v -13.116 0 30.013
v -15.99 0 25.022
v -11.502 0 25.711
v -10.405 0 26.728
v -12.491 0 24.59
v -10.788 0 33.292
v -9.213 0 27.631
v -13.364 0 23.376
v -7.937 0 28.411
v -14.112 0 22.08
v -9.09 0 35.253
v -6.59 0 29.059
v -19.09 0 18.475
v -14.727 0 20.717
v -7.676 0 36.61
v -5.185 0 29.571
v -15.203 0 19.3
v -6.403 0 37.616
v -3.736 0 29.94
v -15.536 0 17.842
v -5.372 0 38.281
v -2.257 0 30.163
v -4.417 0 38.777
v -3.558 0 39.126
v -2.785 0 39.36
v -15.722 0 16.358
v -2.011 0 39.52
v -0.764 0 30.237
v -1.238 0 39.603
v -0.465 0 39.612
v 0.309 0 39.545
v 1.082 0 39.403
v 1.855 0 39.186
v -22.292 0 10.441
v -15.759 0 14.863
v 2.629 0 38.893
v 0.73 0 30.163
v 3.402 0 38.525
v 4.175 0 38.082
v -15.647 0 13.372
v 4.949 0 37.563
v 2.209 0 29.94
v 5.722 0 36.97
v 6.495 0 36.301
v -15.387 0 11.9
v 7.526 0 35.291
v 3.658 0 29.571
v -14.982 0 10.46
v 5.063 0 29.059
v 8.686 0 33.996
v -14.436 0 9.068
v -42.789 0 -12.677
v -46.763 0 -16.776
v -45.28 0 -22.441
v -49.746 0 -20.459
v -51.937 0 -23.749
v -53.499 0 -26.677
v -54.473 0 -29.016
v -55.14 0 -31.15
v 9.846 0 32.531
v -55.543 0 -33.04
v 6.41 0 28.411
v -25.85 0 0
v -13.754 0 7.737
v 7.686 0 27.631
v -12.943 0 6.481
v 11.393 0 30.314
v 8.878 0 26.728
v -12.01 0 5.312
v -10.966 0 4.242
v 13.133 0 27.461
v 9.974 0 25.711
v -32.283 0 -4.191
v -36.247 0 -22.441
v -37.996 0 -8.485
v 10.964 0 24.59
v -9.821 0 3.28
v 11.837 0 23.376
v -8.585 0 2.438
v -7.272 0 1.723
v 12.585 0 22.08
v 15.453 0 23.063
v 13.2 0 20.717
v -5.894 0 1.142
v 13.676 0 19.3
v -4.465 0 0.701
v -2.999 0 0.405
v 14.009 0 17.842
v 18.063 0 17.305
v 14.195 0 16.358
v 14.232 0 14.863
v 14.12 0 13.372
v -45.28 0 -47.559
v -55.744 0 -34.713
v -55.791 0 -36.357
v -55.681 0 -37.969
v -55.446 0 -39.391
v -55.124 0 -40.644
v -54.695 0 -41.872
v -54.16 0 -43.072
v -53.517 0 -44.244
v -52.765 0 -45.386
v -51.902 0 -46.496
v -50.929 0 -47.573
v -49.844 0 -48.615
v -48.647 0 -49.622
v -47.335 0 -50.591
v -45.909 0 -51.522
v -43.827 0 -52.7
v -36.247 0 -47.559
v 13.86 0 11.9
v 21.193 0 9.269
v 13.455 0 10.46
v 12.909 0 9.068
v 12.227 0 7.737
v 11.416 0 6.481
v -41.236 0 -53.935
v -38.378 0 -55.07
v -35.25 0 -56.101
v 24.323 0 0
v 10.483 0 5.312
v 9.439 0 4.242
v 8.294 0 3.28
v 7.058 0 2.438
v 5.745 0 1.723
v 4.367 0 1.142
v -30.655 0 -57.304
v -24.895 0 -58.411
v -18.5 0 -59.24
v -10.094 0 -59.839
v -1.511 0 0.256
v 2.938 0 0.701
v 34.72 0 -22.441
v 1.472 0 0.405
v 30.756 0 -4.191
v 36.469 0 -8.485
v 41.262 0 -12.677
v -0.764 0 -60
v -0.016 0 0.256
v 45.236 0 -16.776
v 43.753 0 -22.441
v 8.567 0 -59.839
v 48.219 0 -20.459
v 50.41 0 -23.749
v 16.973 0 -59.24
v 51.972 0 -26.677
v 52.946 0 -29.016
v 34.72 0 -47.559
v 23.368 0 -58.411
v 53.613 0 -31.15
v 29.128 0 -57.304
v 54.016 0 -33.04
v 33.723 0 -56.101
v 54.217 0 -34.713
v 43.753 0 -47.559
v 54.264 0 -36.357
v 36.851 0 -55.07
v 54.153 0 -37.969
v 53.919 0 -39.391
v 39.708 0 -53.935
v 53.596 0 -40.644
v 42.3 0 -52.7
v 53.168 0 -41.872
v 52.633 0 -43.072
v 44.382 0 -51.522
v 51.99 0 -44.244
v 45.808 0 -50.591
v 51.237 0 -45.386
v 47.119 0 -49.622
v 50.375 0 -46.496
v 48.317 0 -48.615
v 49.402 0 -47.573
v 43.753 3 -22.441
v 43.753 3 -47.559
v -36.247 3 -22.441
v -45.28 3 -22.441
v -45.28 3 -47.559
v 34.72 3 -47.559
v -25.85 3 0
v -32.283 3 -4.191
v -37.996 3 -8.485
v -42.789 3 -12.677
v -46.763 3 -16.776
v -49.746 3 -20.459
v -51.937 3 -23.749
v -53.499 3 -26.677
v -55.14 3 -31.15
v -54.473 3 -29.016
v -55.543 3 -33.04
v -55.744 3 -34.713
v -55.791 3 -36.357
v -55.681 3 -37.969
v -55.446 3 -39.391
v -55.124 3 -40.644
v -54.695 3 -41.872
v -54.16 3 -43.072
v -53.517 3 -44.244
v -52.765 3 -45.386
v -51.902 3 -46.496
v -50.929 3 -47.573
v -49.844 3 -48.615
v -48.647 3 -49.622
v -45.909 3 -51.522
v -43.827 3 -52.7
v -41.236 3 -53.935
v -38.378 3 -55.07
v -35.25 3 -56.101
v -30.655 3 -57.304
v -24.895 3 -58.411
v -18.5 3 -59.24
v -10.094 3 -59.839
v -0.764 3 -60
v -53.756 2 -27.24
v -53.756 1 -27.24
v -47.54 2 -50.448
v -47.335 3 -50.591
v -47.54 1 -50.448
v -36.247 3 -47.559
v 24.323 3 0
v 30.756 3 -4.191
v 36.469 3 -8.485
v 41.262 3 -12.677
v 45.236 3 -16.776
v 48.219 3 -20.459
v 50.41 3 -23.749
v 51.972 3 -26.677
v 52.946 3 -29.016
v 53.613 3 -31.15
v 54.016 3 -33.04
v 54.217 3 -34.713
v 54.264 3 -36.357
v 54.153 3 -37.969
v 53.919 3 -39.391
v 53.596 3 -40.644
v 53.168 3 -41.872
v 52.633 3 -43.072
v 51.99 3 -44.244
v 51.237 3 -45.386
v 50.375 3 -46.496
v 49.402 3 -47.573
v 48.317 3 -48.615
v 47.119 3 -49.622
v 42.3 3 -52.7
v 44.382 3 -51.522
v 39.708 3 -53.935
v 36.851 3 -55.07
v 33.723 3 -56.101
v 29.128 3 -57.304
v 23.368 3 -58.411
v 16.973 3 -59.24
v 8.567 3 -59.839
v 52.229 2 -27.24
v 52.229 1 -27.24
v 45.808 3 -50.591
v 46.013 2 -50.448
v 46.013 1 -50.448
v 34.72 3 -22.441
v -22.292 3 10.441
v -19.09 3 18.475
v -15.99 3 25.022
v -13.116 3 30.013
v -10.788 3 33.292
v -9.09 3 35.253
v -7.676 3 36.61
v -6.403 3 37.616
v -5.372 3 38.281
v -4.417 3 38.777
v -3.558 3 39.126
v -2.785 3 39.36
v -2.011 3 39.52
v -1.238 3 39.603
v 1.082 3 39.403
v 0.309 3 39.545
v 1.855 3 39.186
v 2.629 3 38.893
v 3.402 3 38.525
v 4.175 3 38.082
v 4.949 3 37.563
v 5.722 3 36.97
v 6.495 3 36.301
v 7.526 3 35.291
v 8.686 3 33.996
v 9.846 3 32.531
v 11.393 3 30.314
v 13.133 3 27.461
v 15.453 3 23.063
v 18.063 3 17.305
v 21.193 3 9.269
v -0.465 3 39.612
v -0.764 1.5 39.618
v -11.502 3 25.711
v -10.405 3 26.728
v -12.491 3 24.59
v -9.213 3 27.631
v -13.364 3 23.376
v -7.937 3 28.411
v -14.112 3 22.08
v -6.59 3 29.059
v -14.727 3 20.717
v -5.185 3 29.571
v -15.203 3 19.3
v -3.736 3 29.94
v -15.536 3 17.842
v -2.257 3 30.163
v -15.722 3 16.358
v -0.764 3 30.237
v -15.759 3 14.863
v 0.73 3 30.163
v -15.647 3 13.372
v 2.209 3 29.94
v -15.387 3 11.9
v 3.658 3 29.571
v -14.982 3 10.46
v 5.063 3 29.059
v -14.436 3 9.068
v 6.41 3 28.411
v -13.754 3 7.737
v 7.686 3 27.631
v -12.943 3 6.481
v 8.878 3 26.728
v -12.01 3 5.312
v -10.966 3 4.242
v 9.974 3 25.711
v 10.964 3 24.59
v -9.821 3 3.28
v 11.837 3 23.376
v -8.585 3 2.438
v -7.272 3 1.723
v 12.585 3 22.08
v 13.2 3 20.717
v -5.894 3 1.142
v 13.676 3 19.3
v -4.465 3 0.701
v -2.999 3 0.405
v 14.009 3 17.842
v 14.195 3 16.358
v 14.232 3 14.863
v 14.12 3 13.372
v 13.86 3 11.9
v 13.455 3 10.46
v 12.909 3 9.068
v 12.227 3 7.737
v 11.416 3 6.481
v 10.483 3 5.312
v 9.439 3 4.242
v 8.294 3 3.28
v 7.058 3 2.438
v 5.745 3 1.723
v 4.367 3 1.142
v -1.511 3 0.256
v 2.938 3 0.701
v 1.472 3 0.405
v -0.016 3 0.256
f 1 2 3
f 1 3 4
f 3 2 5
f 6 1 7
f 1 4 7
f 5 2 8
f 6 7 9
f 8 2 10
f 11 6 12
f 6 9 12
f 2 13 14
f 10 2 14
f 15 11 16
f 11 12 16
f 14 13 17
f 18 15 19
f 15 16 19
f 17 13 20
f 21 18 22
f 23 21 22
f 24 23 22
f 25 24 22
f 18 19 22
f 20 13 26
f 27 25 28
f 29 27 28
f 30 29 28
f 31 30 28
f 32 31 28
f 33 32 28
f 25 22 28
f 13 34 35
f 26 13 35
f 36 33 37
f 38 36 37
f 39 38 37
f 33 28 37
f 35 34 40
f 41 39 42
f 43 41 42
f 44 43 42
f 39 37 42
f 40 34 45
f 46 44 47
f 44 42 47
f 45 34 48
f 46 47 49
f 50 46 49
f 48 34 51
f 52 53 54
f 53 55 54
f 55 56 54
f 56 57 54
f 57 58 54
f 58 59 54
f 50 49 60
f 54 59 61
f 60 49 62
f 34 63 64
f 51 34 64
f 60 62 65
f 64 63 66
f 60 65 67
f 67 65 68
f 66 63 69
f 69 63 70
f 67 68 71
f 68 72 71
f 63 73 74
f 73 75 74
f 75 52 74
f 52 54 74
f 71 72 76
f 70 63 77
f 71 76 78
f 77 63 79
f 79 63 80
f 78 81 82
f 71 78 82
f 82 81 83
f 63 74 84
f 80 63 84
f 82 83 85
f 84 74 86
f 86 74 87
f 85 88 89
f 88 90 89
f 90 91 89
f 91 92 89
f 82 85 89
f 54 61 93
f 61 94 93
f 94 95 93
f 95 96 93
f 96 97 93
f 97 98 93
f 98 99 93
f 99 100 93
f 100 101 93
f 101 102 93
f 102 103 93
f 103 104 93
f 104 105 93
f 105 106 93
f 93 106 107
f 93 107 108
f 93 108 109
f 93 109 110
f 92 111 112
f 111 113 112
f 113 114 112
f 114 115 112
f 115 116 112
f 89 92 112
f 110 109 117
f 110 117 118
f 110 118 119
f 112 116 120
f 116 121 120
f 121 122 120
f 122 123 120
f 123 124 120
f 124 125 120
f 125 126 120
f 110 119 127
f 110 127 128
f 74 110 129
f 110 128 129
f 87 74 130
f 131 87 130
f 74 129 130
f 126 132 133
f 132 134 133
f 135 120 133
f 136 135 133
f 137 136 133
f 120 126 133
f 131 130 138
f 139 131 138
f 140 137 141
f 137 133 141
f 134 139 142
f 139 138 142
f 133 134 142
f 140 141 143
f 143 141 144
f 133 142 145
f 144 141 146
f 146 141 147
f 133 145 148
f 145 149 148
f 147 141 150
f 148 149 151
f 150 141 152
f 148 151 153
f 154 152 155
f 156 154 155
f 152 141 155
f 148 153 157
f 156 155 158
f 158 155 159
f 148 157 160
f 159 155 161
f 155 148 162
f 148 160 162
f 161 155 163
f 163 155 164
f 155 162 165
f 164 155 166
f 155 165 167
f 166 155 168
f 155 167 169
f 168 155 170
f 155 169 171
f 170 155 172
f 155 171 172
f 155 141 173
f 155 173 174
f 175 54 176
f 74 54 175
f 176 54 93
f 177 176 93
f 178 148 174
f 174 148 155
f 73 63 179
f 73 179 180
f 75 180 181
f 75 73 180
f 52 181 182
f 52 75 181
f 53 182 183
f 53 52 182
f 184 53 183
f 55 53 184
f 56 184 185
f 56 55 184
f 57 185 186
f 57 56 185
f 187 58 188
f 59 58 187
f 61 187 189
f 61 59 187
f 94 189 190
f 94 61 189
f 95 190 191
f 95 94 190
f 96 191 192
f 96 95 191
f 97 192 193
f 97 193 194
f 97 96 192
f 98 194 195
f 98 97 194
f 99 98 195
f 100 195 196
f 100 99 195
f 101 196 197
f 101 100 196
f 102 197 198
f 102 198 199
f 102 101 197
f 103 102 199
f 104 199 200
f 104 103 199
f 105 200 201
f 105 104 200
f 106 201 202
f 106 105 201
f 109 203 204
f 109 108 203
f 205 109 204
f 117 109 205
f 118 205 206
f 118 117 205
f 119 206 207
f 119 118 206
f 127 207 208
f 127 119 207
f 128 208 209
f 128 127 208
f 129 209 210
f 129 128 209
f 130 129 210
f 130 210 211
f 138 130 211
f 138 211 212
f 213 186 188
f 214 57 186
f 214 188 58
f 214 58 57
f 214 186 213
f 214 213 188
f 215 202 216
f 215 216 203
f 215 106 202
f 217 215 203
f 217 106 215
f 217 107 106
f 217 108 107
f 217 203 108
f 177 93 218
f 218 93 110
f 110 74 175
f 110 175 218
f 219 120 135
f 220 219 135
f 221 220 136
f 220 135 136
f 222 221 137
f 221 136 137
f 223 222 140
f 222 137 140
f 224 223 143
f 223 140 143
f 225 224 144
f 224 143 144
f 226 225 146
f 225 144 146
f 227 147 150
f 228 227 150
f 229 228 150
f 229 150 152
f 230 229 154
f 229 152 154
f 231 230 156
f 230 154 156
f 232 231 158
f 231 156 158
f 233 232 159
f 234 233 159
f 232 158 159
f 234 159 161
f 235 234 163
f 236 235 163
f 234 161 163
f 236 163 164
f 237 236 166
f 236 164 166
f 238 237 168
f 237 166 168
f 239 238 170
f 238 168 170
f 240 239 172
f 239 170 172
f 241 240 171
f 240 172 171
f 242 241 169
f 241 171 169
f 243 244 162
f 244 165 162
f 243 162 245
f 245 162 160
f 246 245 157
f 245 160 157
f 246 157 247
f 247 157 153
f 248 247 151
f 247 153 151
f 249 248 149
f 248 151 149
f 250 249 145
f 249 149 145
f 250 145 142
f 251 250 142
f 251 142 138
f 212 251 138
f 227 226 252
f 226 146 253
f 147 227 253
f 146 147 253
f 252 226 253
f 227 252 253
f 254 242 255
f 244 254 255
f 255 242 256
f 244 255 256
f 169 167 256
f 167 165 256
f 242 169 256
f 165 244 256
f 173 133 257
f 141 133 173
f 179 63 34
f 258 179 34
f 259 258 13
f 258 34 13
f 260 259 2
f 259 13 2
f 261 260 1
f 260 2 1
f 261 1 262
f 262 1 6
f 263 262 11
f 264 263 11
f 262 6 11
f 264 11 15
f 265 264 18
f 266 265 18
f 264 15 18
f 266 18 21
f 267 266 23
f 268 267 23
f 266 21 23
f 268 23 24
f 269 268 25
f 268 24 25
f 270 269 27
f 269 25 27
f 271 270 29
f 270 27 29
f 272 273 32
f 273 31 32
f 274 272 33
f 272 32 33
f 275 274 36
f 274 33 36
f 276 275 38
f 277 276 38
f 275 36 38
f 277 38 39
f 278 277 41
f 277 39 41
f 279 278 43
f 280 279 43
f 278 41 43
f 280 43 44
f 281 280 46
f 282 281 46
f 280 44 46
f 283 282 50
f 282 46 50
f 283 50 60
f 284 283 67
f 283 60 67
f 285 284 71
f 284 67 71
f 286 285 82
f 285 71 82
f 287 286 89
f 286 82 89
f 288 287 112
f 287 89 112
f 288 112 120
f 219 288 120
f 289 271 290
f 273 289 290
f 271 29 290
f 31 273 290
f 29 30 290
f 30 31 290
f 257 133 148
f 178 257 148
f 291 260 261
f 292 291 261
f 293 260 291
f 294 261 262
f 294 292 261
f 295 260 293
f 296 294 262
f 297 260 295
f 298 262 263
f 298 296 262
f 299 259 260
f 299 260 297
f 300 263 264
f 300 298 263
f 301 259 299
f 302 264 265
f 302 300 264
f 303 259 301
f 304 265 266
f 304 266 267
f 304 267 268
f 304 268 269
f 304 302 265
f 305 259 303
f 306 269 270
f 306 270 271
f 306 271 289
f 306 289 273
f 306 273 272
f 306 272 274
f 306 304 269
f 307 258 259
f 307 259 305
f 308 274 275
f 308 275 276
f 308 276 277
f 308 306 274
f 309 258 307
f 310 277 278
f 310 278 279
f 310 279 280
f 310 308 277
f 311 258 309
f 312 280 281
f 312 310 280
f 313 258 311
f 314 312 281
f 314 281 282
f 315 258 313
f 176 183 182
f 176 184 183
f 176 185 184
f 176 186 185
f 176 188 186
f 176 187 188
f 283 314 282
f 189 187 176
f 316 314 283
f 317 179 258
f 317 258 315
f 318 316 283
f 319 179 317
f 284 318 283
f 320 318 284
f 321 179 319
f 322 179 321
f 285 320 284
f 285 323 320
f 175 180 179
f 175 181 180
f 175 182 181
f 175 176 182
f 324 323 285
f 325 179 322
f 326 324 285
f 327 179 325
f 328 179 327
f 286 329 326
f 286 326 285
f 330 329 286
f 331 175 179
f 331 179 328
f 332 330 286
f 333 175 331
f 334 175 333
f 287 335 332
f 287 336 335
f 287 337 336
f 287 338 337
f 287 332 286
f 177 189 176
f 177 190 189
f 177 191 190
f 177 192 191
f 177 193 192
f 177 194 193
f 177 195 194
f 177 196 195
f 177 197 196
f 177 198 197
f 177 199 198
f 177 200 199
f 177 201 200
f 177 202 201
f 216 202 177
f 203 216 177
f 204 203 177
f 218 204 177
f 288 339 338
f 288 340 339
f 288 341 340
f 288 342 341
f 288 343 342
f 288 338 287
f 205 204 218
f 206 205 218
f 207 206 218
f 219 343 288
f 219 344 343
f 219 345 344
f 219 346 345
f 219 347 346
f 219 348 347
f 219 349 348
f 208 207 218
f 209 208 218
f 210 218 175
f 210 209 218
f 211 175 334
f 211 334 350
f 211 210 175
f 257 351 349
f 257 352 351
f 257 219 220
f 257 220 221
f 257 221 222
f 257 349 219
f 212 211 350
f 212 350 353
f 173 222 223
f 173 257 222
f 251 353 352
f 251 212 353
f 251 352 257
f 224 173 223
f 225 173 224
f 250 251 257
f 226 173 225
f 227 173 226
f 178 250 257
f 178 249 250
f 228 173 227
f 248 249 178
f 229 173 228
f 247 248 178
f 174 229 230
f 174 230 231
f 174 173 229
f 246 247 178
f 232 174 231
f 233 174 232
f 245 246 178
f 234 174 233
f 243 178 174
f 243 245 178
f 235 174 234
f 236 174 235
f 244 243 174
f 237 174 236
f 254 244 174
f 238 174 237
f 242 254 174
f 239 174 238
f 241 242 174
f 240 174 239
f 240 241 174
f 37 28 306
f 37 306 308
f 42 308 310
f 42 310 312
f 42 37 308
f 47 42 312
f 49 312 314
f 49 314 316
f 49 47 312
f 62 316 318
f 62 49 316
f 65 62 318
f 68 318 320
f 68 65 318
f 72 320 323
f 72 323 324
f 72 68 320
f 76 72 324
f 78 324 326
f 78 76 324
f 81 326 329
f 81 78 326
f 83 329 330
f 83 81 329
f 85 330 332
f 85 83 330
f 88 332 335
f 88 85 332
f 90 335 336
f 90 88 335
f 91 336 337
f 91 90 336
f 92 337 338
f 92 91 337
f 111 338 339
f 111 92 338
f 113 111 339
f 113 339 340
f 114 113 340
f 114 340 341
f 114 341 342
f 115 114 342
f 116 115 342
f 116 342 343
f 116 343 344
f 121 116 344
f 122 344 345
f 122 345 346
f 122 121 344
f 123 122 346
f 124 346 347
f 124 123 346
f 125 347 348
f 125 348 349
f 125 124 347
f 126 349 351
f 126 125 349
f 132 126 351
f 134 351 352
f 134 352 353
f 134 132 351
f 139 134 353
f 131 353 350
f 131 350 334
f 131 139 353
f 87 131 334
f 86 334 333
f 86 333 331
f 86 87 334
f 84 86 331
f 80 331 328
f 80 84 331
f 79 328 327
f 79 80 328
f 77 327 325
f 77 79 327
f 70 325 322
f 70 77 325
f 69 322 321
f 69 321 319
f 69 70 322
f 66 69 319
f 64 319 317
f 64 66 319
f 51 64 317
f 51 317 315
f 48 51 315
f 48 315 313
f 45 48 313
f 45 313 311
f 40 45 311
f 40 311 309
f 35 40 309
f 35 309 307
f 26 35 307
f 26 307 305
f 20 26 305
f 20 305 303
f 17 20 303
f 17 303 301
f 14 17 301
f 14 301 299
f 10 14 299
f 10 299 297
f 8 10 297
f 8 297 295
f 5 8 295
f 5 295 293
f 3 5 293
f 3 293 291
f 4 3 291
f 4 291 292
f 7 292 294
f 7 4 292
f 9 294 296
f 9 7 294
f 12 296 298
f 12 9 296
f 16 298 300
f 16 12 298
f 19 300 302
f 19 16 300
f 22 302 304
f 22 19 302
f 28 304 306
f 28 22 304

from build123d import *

# Parameters (mm, degrees)
SKETCH1_R           = 15
SKETCH1_W           = 9.033789511
SKETCH1_H           = 25.11797261
BOSS_EXTRUDE1_DEPTH = 3


with BuildPart() as part:
    # Sketch1 → Boss-Extrude1 (new body)
    with BuildSketch(Plane(origin=(0, 0, 0), x_dir=(1, 0, 0), z_dir=(0, 1, 0))):
        with BuildLine():
            add(Edge.make_bspline(
                [(-25.850267552, 0), (-0.763553632, -79.235152429), (24.323160288, 0)],
                knots=[0, 0, 0, 1, 1, 1], degree=2))
            add(Edge.make_bspline(
                [(24.323160288, 0), (67.143381198, 26.049823561), (68.440320284, 60.482028786), (-0.763553632, 60)],
                knots=[0, 0, 0, 0, 1, 1, 1, 1], degree=3))
            add(Edge.make_bspline(
                [(-25.850267552, 0), (-68.670488462, 26.049823561), (-69.967427548, 60.482028786), (-0.763553632, 60)],
                knots=[0, 0, 0, 0, 1, 1, 1, 1], degree=3))
        make_face()
        with Locations(Location((-0.763553632, -15.237324398, 0), (0, 0, 270))):
            Circle(SKETCH1_R, mode=Mode.SUBTRACT)
        with Locations((39.236446368, 35)):
            Rectangle(SKETCH1_W, SKETCH1_H, mode=Mode.SUBTRACT)
        with Locations((-40.763553633, 35)):
            Rectangle(SKETCH1_W, SKETCH1_H, mode=Mode.SUBTRACT)
    extrude(amount=BOSS_EXTRUDE1_DEPTH)


solid = part.part
